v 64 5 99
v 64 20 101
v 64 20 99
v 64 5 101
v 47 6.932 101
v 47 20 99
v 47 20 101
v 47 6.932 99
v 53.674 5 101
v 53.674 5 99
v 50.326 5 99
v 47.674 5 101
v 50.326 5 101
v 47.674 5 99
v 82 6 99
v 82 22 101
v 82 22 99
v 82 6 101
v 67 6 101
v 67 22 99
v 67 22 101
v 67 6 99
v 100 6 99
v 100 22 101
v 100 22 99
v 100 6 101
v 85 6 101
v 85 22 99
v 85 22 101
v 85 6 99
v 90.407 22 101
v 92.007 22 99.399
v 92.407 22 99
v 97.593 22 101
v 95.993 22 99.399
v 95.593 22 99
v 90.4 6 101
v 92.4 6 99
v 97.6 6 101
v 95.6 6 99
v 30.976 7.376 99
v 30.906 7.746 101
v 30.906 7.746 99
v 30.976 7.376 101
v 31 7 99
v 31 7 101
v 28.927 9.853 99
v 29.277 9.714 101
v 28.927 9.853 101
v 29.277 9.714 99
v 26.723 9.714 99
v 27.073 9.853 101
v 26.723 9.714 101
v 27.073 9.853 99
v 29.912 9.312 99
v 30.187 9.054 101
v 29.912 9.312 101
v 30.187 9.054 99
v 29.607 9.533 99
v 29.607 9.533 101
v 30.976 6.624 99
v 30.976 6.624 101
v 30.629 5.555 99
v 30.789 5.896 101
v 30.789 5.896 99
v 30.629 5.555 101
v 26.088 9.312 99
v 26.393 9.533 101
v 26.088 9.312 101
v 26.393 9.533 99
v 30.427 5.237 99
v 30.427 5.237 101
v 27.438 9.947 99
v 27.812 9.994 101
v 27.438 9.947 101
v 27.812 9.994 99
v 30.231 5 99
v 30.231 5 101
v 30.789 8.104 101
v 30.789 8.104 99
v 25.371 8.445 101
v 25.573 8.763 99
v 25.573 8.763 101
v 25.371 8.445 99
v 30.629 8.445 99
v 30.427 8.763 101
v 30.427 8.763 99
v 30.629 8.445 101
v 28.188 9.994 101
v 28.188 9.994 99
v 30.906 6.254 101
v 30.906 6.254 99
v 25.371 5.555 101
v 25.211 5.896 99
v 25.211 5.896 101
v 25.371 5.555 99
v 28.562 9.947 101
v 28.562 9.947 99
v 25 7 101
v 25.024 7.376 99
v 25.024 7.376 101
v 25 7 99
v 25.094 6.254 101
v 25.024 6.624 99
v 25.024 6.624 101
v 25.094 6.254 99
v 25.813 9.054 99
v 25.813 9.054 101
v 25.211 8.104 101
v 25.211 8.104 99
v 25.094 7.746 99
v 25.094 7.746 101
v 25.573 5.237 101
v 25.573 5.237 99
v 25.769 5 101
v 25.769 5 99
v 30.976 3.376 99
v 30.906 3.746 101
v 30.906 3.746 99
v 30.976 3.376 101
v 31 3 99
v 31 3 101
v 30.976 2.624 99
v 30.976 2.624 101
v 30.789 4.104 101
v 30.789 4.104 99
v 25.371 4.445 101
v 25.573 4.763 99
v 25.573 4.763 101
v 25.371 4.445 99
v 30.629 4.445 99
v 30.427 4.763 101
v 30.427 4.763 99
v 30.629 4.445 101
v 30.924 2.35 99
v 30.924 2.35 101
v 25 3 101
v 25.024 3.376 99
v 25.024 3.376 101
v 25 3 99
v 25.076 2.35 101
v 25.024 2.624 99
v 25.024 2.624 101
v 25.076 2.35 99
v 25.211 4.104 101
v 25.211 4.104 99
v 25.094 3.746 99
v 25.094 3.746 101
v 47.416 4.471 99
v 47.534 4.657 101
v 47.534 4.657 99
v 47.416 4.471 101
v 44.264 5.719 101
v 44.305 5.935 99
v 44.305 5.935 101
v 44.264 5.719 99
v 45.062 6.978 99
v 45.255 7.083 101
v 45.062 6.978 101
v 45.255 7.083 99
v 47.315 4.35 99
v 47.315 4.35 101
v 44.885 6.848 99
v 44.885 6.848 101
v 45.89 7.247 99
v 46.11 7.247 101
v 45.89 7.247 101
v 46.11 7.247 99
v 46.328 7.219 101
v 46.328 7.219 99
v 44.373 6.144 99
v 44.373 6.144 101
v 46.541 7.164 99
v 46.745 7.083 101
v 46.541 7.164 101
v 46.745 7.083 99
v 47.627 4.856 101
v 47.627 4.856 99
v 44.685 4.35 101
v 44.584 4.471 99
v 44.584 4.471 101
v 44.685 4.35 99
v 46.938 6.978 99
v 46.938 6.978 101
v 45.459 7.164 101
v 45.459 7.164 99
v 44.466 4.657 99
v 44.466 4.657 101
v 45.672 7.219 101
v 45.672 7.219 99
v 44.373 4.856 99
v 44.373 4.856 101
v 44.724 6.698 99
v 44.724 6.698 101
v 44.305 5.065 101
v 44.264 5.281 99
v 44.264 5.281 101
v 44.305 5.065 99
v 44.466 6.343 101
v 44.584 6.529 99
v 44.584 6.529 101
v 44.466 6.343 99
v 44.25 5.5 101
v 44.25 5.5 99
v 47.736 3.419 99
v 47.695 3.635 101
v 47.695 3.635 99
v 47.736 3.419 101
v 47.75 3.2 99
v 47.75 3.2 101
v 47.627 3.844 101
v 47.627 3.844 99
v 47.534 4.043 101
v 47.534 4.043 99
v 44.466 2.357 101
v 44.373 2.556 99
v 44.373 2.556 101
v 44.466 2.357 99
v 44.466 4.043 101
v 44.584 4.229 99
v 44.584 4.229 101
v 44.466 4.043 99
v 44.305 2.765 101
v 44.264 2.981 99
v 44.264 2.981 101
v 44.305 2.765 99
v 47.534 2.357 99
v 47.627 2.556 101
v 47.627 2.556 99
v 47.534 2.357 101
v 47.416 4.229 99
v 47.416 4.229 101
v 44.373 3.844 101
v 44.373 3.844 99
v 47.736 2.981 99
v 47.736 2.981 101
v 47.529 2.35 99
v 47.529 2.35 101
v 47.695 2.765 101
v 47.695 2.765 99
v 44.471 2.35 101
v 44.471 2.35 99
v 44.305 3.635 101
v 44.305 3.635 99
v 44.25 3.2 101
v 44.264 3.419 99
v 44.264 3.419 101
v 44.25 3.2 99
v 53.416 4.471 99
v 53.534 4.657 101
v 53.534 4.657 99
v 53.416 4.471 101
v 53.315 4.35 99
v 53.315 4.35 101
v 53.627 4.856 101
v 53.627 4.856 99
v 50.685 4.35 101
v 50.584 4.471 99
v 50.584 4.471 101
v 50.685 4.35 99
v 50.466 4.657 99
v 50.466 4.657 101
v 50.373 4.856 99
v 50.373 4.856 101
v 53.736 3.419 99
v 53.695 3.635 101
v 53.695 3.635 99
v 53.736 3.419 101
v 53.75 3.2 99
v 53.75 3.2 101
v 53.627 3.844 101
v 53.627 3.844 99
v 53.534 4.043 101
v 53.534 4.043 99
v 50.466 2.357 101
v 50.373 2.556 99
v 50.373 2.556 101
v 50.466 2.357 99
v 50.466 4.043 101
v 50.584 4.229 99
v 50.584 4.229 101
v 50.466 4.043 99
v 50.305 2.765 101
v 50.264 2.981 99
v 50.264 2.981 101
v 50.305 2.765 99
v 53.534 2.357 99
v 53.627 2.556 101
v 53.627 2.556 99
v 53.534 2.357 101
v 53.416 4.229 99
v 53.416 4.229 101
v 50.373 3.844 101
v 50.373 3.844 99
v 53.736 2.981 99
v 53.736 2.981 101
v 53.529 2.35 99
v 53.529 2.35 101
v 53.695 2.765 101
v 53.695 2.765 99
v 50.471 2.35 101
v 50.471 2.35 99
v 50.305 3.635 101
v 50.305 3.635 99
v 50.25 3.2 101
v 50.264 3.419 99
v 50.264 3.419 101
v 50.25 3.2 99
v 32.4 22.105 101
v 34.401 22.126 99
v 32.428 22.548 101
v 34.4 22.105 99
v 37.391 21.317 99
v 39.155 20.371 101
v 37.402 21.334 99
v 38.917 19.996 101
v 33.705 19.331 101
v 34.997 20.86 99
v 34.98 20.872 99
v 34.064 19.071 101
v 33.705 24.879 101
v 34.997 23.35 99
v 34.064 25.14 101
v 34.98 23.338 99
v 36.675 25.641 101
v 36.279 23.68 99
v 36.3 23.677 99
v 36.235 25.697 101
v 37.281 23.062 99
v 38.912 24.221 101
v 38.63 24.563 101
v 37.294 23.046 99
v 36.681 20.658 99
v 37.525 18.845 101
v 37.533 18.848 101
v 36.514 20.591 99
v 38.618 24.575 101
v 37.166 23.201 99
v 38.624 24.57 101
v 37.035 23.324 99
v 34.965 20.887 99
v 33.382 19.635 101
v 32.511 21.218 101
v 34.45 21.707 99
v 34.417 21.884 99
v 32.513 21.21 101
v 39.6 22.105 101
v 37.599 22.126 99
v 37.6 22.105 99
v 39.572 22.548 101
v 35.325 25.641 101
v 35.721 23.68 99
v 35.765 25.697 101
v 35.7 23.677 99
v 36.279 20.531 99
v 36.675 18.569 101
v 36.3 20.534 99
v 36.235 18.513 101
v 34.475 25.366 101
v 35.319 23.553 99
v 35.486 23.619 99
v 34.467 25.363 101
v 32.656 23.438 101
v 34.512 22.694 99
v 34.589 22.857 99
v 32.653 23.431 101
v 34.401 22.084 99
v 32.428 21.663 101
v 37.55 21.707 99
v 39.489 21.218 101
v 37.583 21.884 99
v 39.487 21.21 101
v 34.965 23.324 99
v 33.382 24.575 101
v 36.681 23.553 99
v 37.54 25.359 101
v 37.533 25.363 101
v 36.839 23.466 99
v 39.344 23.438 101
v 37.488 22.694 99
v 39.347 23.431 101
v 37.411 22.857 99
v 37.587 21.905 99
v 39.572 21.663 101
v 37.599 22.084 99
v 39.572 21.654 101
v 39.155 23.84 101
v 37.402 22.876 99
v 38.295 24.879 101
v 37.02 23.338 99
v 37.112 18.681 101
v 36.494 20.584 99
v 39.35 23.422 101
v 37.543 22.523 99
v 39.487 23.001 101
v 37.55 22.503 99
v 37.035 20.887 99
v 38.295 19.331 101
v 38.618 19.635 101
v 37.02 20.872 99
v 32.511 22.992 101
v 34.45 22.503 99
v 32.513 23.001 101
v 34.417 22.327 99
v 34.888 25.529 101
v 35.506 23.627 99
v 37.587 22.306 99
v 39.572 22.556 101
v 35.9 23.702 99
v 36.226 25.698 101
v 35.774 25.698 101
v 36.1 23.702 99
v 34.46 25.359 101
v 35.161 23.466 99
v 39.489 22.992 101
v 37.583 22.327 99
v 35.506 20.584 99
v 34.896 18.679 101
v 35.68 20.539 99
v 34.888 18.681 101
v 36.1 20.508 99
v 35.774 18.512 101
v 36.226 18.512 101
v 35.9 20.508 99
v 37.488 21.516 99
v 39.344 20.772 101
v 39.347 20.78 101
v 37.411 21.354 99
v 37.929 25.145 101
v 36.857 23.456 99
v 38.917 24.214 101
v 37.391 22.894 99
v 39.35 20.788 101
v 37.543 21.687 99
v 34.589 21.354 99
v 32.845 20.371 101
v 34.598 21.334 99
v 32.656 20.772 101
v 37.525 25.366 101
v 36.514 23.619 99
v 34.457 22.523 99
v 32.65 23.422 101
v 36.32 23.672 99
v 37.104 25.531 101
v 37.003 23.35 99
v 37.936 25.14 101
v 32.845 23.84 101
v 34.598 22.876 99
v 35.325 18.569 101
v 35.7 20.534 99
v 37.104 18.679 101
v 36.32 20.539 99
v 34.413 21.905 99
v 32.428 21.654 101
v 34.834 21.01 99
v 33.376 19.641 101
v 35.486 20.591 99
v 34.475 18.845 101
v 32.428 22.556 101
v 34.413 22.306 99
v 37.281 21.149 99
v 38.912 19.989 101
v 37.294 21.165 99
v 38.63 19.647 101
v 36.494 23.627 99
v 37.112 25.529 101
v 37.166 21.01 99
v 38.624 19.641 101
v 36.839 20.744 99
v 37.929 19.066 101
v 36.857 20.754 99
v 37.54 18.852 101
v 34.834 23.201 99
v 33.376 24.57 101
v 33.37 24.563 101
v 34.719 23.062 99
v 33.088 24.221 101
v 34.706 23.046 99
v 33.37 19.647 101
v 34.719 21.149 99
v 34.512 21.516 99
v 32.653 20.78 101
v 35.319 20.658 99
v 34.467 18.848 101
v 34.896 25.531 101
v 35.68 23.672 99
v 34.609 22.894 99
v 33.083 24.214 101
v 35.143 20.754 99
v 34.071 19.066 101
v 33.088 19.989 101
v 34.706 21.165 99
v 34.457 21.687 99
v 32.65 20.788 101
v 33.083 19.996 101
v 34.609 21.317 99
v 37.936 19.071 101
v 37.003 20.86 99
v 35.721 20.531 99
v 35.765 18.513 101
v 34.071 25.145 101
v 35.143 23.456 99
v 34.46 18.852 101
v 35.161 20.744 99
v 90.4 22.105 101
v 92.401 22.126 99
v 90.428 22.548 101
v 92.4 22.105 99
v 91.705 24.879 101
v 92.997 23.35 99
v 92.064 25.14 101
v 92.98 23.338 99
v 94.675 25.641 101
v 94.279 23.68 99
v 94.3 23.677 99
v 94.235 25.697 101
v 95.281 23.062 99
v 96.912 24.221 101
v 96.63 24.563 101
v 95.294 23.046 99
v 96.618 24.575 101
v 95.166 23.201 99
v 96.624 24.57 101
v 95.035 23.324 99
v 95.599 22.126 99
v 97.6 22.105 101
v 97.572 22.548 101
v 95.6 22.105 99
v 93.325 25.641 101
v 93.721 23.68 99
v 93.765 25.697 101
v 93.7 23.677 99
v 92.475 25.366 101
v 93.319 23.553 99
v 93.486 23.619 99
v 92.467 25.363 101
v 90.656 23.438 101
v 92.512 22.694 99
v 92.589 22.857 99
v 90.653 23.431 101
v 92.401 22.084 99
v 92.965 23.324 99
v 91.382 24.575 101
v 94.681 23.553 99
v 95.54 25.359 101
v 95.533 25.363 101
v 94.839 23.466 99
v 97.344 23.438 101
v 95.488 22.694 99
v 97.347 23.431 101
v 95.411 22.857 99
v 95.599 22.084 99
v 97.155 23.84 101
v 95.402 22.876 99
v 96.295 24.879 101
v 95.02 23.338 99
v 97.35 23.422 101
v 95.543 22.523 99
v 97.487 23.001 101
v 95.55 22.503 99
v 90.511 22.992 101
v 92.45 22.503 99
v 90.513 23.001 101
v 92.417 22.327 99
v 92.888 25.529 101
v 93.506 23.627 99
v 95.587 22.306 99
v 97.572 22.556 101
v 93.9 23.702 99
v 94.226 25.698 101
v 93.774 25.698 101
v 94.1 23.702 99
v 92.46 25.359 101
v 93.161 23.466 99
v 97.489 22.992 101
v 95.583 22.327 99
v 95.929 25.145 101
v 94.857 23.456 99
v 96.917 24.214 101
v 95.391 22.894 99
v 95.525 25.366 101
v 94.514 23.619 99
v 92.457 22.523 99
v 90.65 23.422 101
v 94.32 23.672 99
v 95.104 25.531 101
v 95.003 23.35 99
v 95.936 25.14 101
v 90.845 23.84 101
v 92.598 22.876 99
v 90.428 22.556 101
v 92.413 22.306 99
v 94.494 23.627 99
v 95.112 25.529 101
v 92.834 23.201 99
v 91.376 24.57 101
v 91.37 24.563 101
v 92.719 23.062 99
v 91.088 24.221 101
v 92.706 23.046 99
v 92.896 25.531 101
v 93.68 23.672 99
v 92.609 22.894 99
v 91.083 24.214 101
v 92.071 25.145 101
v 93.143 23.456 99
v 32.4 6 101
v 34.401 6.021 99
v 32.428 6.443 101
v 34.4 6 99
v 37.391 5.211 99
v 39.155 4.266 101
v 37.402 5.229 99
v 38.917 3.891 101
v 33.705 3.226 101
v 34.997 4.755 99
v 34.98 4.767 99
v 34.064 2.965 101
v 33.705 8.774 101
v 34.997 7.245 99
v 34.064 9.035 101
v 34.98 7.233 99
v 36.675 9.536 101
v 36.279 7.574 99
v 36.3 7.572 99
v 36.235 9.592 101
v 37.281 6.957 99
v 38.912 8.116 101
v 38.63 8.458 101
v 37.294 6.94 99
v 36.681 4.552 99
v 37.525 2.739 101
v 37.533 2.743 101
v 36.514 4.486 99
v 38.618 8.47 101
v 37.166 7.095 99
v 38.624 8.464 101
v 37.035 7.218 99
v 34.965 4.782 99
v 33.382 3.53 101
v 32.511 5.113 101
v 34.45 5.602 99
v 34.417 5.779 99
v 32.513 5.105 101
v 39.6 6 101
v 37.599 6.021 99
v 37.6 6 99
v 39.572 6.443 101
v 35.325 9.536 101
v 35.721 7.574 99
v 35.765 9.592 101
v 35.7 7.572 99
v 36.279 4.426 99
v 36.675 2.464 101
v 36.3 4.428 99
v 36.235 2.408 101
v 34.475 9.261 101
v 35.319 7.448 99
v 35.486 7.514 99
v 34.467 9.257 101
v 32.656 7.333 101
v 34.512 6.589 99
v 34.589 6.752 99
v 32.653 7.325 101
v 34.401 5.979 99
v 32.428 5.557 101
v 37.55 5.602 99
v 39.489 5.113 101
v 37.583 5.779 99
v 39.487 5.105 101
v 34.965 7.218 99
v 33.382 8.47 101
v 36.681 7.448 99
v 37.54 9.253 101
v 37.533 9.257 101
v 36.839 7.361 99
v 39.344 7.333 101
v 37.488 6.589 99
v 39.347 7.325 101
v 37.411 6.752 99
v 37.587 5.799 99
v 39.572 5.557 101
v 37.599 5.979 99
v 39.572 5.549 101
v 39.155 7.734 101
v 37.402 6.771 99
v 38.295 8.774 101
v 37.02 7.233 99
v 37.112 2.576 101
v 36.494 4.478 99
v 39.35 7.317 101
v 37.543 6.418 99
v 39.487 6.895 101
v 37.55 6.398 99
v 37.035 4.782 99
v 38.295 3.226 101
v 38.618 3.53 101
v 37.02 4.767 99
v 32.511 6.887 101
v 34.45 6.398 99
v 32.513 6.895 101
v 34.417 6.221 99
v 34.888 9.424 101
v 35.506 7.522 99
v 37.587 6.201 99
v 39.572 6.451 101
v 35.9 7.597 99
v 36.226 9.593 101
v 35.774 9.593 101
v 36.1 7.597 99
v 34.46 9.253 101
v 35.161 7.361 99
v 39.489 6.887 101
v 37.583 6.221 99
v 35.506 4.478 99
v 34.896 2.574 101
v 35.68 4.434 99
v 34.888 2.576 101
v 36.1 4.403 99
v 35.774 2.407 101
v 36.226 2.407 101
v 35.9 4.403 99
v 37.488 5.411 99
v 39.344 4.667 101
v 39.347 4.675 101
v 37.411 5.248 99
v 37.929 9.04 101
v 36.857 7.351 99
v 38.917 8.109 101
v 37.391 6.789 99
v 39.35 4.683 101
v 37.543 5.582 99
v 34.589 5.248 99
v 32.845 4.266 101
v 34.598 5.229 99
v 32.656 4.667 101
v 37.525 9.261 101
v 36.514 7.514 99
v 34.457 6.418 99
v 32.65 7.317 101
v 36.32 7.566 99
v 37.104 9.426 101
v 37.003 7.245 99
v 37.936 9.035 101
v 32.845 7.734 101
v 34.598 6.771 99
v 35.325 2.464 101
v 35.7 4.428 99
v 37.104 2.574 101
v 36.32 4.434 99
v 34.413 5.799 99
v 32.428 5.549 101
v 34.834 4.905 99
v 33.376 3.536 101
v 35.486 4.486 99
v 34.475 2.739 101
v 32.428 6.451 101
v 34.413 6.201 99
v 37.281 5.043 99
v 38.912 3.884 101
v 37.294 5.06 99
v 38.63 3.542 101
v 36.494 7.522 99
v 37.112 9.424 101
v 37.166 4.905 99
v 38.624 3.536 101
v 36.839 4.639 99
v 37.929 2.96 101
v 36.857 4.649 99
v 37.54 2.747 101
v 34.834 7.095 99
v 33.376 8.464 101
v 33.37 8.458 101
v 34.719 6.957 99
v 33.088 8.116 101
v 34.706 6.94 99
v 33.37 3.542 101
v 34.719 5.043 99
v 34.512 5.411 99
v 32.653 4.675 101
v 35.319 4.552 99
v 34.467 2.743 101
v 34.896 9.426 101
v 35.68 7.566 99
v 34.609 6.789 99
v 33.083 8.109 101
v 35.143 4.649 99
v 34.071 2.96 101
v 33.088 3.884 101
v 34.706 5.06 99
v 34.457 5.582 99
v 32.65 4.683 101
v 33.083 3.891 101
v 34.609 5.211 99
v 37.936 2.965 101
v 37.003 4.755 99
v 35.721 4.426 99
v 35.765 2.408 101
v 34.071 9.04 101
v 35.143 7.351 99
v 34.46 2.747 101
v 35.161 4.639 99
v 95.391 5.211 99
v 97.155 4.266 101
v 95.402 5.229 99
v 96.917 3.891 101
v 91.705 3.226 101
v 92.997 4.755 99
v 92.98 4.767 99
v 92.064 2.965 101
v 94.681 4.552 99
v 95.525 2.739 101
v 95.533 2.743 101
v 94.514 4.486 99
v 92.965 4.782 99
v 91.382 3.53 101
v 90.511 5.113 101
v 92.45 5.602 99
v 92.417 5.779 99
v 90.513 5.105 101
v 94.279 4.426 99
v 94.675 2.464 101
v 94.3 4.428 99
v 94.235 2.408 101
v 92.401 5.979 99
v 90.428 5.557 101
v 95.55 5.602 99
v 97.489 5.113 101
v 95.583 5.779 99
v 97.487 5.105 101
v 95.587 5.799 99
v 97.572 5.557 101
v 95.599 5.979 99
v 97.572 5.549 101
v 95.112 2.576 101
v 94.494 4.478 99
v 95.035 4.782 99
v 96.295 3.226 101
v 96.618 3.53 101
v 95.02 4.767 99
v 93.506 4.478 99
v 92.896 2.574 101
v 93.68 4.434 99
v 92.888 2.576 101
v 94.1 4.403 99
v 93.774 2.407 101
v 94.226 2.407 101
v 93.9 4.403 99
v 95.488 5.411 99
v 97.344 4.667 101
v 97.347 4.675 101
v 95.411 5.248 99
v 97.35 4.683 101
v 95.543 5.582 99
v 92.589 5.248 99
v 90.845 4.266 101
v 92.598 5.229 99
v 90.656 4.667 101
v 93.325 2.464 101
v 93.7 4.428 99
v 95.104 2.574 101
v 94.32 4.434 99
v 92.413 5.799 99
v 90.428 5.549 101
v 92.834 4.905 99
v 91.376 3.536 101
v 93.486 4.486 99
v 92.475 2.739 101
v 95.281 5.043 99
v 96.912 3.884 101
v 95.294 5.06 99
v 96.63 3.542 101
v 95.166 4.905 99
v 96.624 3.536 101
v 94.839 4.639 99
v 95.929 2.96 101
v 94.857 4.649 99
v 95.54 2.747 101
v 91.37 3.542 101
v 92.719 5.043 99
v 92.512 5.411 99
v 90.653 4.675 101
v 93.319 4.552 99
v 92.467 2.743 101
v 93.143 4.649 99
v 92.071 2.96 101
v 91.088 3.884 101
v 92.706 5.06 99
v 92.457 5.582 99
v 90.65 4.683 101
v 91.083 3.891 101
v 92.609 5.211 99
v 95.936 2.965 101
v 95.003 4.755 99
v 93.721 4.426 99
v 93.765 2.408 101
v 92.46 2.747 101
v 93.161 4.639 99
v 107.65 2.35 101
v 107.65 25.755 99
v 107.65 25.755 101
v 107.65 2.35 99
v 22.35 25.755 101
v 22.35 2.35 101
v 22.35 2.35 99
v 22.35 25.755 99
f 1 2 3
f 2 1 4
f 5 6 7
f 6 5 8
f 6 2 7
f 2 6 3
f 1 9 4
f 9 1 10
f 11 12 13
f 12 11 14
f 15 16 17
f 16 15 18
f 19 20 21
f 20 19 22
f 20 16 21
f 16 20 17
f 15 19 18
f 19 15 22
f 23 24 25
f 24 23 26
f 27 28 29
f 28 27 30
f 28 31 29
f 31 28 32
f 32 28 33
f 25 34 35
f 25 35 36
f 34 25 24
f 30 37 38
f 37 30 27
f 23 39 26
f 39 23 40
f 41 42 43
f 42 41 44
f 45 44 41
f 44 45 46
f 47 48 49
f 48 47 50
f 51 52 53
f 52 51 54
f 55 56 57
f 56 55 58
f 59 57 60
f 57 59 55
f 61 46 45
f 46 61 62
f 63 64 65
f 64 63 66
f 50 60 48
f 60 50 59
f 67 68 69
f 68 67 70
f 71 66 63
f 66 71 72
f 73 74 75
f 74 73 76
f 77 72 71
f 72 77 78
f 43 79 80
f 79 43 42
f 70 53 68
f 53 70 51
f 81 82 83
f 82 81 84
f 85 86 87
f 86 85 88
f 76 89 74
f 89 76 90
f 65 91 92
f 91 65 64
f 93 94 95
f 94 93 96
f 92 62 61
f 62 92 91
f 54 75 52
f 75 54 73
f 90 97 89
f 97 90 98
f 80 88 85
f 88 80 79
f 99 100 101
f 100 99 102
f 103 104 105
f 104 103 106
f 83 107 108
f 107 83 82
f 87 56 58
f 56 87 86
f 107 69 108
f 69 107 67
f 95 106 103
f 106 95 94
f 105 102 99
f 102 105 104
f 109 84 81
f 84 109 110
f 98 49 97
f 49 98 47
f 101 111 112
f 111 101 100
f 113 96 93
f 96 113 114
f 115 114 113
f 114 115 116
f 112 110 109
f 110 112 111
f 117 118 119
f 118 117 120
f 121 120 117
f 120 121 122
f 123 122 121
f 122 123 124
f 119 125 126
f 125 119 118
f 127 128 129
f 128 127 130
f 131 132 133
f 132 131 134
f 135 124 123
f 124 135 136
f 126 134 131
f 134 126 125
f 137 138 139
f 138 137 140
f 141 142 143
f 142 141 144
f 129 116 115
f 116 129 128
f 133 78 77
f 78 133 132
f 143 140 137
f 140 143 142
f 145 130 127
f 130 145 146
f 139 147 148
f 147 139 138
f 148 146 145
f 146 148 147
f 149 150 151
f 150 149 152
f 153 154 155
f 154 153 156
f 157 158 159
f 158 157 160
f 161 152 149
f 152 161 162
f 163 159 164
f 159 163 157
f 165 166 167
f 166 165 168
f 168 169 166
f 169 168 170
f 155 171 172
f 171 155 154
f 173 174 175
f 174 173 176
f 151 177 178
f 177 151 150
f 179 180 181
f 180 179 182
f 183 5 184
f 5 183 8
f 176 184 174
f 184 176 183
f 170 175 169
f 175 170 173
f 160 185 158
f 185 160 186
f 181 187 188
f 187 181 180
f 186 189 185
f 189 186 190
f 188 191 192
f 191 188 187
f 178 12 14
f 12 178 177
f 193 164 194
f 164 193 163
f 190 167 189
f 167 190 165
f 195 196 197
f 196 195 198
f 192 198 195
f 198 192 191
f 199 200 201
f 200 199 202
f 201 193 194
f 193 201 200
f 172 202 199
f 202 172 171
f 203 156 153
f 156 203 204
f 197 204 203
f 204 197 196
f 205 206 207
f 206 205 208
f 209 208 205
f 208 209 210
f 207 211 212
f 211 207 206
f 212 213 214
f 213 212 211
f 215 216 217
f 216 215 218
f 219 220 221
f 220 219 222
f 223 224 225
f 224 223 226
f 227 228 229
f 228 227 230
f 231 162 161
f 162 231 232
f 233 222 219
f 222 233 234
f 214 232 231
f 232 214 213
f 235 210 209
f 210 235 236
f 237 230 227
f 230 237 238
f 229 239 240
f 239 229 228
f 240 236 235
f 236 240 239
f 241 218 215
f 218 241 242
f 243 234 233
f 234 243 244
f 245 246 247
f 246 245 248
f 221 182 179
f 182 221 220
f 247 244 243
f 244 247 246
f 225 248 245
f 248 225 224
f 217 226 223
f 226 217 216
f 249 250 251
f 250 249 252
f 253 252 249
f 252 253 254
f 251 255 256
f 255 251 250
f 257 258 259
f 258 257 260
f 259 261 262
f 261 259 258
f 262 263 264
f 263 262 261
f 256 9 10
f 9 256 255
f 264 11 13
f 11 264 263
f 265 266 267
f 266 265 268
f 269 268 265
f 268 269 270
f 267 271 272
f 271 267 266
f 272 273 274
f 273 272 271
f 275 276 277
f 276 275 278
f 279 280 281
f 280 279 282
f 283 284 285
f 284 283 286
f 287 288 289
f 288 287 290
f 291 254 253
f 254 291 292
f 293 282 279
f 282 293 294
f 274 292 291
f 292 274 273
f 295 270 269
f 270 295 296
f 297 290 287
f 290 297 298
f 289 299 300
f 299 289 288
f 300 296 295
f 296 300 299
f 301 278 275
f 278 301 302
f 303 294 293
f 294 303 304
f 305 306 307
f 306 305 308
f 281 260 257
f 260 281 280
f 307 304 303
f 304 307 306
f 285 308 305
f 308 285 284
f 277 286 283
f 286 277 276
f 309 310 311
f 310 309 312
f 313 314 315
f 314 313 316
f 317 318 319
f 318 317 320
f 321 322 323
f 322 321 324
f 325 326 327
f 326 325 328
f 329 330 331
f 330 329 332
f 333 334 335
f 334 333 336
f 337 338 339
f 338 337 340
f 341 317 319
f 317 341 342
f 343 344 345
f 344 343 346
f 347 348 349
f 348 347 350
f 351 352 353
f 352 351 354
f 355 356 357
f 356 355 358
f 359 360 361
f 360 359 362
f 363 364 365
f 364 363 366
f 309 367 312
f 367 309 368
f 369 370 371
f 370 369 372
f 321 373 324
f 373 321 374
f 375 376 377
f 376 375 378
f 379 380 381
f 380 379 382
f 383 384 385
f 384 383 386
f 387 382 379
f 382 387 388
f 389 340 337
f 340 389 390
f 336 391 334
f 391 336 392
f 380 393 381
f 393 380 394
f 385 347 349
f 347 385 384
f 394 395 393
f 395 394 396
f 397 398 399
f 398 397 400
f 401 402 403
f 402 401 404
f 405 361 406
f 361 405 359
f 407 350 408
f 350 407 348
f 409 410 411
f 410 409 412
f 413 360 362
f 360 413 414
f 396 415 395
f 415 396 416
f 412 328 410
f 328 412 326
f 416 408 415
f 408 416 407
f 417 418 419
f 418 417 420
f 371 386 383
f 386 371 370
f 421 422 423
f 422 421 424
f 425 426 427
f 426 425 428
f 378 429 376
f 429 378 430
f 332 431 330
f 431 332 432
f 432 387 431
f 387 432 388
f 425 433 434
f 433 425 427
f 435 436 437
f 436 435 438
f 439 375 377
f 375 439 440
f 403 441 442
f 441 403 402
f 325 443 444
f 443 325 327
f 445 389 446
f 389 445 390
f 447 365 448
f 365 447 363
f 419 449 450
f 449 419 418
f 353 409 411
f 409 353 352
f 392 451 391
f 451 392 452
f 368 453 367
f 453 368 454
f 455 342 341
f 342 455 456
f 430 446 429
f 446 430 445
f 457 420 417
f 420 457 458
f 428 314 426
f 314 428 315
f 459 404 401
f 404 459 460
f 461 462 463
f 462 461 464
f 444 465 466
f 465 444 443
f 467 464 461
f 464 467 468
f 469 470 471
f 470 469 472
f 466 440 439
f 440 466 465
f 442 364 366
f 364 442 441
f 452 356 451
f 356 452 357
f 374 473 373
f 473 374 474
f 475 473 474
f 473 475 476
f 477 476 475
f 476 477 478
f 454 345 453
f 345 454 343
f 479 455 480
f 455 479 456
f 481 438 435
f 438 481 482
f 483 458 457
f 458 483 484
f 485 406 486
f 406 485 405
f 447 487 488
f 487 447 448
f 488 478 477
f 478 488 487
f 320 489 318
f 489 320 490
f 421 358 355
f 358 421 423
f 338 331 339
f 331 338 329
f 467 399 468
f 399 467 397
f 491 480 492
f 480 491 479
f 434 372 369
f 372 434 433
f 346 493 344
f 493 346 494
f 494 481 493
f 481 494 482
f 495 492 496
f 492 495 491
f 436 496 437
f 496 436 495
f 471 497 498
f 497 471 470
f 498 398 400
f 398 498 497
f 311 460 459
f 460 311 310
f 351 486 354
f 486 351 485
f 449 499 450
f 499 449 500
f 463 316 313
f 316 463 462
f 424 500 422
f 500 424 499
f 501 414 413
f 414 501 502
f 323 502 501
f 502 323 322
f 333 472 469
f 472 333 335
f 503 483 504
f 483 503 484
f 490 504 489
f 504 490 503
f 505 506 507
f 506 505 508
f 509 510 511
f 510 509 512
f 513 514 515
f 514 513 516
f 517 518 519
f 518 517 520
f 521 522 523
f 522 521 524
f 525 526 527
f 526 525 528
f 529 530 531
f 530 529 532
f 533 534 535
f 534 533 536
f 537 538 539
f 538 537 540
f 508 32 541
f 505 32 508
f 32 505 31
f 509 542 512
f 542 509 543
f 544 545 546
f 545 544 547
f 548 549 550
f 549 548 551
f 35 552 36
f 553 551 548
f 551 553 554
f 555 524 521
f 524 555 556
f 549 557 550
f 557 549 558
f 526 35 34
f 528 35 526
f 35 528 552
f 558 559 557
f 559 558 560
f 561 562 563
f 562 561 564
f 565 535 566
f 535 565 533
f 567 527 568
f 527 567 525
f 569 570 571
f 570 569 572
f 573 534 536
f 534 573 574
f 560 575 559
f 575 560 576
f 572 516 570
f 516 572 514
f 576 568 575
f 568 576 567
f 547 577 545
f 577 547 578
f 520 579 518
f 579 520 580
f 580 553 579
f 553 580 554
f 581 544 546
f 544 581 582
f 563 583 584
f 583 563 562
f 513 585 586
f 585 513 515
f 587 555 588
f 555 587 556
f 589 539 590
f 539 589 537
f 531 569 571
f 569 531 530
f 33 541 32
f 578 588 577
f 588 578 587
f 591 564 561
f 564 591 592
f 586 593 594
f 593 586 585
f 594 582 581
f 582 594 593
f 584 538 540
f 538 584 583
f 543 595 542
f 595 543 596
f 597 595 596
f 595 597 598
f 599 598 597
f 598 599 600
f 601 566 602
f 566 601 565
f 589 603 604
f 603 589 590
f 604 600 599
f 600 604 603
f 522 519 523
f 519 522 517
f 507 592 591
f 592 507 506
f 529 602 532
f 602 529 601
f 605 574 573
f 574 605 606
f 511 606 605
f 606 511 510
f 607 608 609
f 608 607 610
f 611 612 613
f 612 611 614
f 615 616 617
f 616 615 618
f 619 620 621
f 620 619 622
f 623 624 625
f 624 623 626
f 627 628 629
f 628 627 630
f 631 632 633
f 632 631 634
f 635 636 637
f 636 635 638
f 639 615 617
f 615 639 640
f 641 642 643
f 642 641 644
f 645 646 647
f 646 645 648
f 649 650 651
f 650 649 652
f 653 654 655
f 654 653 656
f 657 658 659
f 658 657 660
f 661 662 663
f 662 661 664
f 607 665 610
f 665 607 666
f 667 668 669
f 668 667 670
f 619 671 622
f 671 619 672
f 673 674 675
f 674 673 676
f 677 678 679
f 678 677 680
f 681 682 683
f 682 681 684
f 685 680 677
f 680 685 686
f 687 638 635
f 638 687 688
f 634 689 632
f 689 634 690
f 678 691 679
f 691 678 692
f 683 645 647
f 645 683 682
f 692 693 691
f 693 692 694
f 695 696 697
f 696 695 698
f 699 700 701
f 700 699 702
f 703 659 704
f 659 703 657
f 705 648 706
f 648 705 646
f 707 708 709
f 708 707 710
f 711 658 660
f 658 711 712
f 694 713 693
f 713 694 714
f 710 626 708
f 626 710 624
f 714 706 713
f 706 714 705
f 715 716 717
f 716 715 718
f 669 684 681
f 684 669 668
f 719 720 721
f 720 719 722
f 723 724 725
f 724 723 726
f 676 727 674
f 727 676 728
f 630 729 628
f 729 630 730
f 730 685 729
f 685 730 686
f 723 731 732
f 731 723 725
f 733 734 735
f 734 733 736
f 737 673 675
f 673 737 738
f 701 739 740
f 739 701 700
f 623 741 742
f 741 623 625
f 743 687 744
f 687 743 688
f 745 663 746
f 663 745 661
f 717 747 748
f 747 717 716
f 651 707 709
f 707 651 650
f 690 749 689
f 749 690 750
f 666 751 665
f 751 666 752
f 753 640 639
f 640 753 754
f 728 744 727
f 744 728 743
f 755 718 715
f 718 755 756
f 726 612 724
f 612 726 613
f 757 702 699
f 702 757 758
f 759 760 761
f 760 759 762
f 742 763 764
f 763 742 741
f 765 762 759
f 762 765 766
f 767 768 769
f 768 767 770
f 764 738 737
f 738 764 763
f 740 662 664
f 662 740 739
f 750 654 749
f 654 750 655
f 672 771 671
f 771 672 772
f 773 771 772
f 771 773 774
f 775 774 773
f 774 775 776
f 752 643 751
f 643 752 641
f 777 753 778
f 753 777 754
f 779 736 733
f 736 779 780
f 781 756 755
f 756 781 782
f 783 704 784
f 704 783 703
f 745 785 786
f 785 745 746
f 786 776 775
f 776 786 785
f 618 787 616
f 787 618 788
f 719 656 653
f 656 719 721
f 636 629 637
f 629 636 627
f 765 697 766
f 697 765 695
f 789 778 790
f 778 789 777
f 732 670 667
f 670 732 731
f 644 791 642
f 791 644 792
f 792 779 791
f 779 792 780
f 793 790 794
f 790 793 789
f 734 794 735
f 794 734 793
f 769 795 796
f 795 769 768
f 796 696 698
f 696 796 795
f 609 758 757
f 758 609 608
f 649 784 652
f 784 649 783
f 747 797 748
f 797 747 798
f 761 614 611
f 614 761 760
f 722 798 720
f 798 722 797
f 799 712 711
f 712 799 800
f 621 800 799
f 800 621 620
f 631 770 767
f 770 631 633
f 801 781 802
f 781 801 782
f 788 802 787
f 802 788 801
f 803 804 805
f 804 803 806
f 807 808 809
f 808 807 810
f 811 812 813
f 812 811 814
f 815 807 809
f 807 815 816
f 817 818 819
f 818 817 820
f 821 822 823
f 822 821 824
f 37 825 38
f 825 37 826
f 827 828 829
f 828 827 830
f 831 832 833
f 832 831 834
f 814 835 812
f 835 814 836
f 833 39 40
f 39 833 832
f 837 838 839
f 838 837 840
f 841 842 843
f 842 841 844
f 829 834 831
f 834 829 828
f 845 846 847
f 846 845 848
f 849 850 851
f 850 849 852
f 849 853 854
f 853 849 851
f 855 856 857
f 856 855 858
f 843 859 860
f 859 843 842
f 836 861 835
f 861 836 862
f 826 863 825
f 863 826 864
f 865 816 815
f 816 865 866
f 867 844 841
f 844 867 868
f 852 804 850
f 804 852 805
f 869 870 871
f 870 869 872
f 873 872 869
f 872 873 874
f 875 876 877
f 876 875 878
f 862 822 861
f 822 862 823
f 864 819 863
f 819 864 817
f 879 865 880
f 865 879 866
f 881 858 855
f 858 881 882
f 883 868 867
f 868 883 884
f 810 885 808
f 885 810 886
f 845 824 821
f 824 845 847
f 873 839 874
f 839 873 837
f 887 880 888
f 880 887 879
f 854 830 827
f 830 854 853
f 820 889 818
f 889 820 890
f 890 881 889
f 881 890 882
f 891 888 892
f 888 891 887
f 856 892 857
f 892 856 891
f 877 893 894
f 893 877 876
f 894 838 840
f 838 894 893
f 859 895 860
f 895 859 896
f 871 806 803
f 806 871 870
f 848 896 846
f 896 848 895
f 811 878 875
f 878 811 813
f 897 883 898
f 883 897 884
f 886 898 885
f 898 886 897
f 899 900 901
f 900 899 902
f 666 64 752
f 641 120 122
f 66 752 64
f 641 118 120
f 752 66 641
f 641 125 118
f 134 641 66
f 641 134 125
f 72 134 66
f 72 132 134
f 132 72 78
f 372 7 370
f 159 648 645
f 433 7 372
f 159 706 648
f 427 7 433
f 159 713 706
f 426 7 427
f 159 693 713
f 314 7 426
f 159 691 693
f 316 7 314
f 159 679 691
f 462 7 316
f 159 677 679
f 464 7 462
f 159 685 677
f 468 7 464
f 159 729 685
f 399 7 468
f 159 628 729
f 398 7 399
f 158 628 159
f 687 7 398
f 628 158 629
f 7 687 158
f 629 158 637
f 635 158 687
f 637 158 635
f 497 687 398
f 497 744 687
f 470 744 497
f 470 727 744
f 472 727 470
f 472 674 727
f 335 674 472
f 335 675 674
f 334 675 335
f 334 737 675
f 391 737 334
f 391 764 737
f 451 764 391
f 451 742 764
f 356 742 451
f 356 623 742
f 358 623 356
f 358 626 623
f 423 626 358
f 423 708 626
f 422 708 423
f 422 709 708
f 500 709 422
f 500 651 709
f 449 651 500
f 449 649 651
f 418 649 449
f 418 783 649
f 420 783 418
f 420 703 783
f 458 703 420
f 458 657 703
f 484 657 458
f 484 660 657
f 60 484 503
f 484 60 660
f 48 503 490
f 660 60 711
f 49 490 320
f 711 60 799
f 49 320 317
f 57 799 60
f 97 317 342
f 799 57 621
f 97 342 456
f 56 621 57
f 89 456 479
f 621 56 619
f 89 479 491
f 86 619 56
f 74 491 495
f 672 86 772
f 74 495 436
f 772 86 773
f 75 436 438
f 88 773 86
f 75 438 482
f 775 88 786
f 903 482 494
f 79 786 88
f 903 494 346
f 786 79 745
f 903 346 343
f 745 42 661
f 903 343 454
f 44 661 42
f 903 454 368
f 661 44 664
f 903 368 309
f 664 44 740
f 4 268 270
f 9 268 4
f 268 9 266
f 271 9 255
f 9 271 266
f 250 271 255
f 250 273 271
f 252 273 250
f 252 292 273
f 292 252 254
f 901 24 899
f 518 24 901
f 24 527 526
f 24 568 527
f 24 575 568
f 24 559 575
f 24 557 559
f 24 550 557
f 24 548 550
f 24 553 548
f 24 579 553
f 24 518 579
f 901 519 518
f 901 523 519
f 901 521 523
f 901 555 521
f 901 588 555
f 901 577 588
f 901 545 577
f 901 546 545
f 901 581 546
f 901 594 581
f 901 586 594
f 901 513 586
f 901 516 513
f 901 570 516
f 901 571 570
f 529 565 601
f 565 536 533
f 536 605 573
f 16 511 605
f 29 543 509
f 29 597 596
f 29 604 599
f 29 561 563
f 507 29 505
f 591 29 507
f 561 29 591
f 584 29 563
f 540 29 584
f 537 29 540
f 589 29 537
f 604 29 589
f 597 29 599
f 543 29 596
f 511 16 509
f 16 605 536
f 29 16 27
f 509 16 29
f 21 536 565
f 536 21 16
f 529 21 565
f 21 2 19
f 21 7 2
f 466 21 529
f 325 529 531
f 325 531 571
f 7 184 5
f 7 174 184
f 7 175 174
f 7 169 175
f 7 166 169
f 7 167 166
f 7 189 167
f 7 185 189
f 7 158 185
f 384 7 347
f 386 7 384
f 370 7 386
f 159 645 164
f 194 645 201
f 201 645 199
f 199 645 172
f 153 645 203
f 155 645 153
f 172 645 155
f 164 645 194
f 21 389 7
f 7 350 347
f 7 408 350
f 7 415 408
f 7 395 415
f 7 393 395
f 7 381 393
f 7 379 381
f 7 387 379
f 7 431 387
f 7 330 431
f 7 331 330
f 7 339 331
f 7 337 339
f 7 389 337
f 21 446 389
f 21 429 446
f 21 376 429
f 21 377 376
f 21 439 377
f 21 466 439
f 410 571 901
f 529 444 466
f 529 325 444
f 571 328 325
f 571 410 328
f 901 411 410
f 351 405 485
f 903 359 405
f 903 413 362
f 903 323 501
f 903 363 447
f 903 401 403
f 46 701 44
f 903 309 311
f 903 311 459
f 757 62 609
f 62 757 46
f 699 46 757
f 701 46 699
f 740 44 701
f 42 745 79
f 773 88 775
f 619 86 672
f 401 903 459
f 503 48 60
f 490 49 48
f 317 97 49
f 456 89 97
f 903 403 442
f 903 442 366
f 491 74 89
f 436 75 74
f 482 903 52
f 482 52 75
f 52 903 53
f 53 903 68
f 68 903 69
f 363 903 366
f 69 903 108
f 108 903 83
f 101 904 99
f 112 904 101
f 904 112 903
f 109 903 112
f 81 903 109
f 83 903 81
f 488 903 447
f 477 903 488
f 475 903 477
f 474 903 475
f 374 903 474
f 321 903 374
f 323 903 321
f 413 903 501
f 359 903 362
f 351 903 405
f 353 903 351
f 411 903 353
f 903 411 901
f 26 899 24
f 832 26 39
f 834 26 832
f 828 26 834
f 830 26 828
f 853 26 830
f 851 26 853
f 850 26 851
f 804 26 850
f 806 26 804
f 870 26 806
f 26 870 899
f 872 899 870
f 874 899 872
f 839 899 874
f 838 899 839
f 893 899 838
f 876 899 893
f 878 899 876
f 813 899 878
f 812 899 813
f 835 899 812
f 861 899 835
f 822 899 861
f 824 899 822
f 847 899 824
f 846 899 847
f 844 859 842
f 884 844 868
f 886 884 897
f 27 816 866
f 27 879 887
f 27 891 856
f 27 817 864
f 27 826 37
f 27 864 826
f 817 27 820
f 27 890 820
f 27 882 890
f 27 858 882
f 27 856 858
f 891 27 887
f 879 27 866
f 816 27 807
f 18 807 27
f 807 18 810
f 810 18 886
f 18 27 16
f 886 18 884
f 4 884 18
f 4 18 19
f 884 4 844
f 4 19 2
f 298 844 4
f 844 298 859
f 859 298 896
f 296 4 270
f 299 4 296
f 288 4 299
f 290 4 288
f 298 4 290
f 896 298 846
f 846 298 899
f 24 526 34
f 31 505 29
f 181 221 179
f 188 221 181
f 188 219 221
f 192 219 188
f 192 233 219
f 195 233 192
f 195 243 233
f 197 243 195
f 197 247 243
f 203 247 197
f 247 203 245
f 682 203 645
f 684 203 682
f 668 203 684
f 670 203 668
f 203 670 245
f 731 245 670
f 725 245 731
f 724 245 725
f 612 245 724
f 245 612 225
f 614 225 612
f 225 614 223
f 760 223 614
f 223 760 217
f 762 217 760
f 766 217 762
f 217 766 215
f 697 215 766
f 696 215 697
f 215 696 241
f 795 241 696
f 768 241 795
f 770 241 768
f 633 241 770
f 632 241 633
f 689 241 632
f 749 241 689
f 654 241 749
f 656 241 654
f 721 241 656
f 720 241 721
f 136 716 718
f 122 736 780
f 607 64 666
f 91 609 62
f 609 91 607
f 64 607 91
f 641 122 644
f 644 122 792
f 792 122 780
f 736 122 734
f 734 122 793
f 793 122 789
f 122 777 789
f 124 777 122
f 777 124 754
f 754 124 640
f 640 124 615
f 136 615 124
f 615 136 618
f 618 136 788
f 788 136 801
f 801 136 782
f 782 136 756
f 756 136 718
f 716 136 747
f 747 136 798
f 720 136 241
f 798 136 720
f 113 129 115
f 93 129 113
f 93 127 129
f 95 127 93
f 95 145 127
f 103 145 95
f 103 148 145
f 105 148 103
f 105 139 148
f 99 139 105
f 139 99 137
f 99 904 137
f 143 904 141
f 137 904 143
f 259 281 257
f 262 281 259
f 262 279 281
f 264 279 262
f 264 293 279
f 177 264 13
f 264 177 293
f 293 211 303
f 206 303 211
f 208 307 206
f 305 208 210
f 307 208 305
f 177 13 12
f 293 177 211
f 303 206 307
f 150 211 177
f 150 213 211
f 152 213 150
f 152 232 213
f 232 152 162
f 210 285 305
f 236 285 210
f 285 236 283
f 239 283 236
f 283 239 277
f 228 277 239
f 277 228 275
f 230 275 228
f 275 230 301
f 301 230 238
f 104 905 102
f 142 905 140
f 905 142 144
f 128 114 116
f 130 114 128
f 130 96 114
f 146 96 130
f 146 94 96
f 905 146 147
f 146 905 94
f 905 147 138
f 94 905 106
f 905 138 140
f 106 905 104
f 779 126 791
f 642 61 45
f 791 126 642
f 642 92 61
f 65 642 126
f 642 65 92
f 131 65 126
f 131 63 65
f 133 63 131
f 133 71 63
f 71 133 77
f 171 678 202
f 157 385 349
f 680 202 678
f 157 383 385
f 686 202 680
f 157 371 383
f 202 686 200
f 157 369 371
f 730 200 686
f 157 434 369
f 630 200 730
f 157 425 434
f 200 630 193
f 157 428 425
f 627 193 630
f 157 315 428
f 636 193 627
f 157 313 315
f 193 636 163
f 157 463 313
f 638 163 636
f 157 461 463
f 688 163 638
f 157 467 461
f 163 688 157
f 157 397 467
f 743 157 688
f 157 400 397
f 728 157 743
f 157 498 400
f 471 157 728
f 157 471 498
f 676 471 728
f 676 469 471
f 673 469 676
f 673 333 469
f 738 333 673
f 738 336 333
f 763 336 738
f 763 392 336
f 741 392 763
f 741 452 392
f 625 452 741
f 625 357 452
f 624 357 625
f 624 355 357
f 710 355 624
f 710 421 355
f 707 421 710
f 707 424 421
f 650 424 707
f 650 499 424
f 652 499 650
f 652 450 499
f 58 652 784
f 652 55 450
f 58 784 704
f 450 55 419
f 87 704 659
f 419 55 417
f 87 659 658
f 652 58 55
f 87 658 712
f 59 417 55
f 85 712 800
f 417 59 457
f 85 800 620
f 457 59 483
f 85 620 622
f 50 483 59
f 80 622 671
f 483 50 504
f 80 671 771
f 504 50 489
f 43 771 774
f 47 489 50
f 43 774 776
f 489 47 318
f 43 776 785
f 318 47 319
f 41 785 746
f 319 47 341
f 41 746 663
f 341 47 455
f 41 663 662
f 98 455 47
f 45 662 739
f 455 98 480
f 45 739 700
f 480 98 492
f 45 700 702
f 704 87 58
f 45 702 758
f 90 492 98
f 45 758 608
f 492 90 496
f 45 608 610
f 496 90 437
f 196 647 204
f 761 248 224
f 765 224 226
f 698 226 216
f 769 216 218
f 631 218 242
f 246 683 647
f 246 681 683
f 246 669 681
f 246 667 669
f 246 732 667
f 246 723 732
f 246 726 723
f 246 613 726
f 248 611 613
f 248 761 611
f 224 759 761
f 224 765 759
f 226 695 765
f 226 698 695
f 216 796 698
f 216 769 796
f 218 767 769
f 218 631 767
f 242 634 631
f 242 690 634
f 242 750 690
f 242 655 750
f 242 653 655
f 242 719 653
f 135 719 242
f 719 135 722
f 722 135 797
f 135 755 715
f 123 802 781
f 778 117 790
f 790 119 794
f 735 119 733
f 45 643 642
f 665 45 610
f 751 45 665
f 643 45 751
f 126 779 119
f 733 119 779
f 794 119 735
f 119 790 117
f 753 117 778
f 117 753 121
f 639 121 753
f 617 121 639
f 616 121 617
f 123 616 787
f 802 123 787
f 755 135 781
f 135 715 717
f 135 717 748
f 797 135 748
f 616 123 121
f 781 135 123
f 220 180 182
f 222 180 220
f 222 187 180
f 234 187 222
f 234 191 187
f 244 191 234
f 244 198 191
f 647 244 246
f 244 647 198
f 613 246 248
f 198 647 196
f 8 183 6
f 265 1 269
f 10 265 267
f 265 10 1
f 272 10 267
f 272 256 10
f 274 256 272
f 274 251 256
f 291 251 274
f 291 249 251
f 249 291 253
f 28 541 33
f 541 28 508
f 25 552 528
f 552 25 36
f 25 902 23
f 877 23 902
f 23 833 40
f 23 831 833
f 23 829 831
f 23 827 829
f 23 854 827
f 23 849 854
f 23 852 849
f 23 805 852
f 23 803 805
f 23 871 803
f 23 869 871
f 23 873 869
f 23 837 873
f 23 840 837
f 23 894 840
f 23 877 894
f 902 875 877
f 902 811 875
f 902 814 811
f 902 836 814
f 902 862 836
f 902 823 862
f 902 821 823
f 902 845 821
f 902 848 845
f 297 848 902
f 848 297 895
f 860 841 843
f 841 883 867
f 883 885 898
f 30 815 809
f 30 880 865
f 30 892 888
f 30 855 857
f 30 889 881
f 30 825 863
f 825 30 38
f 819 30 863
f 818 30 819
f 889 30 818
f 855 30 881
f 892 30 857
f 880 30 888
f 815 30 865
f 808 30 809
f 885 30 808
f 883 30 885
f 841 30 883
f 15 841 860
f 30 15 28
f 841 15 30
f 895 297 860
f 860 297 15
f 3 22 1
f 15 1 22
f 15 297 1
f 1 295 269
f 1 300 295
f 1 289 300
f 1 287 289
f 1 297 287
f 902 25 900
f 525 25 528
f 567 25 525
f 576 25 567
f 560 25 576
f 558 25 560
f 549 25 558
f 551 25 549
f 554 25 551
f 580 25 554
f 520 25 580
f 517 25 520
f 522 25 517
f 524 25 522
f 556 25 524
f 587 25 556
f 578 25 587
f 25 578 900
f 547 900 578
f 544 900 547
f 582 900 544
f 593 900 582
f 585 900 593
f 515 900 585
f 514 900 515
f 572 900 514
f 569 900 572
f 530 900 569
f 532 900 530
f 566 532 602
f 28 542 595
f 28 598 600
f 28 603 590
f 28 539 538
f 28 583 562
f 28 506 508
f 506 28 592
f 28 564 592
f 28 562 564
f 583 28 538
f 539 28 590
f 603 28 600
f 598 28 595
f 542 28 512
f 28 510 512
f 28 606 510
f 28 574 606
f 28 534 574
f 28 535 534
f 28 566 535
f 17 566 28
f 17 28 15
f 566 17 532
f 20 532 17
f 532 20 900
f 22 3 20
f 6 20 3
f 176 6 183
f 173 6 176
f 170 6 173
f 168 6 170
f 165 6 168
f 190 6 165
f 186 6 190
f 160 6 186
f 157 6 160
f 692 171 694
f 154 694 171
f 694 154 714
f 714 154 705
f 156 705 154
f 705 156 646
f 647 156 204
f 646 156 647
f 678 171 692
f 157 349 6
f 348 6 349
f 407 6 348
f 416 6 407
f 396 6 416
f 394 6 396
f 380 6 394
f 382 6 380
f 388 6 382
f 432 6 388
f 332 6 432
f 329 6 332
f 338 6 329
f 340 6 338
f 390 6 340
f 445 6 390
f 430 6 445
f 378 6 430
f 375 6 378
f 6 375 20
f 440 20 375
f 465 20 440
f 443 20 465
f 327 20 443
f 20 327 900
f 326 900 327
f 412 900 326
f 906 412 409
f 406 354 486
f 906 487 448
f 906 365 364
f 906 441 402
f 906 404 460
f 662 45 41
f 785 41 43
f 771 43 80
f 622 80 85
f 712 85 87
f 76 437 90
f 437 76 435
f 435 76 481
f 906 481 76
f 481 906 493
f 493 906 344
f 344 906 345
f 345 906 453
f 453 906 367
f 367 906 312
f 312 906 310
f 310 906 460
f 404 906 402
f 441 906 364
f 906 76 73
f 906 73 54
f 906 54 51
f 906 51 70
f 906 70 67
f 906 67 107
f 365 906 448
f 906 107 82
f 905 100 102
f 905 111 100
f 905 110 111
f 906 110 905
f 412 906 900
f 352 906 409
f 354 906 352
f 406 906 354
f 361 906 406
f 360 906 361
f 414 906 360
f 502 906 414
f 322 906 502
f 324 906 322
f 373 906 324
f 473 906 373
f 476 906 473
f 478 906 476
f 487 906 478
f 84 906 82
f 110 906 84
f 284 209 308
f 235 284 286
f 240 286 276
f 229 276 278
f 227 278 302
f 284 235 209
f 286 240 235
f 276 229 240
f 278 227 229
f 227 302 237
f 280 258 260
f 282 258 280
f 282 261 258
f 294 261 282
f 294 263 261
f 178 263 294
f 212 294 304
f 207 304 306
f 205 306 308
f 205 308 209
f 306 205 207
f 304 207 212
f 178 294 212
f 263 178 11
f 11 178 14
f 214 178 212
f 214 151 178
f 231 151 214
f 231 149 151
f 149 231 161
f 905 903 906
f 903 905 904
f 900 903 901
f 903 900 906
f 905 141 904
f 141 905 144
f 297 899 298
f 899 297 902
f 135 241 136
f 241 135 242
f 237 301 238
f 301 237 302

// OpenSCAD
include<../fiveinch_library.scad>


  ///////////////////////////////
 // Raspberry Pi 3 Model B    //
///////////////////////////////

print_frontplate_sml = false;
print_handle_sml     = false;
print_cabinet_sml    = false;
print_lid            = false;
print_rear           = true;

if(print_frontplate_sml){ // Frontplate //
    square_hole        = [];
    round_hole         = [[53 ,7.5, 3.1],[57.5 ,7.5, 3.1]];
    round_peg          = [];   
    screw_side_front   = [];
    screw_top          = [36];
    screw_bottom_front = [36];
    units              = 2; 
    frontplate(units,square_hole,round_hole,round_peg,screw_side_front,screw_top,screw_bottom_front);

}

if(print_handle_sml){ // Handle // 
    units              = 2;
    lay_flat_for_print = false;   
    handle(units,lay_flat_for_print);
}

if(print_cabinet_sml){ // Cabinet //  
    w=76;
    h=70;
    screw_bottom_front = [36];
    screw_side_front   = [];
    round_peg          = [[w,h,6,2.8,4],
                          [w-49,h,6,2.8,4],
                          [w-49,h-58,6,2.8,4],
                          [w,h-58,6,2.8,4]];
    depth              = 98;
    units              = 2;
    cabinet(depth,units,screw_bottom_front,round_peg,screw_side_front);
}

if(print_lid){ // Lid // 
    depth = 98;
    units = 2;
    screw_front = [36];//mm
    screw_back  = [36];//mm
    lid(98,2,screw_front,screw_back);        
}

if(print_rear){  // Back plate //    
    square_hole  = [[25 ,3, 17, 15] , [45 ,4, 15, 16] , [63,4,15,16] ];
    round_hole   = [[6,5,6],[6,1,6], [24,3.5,3.5],[24,1.2,3.5]  ,[30,3.5,3.5],[30,1.2,3.5]];
    screw_top    = [36];//mm
    screw_bottom = [36];//mm
    screw_side   = [];
    depth        = 98;
    units        = 2;
    back_plate(units,depth,screw_top,screw_bottom,screw_side,square_hole,round_hole);
}  
